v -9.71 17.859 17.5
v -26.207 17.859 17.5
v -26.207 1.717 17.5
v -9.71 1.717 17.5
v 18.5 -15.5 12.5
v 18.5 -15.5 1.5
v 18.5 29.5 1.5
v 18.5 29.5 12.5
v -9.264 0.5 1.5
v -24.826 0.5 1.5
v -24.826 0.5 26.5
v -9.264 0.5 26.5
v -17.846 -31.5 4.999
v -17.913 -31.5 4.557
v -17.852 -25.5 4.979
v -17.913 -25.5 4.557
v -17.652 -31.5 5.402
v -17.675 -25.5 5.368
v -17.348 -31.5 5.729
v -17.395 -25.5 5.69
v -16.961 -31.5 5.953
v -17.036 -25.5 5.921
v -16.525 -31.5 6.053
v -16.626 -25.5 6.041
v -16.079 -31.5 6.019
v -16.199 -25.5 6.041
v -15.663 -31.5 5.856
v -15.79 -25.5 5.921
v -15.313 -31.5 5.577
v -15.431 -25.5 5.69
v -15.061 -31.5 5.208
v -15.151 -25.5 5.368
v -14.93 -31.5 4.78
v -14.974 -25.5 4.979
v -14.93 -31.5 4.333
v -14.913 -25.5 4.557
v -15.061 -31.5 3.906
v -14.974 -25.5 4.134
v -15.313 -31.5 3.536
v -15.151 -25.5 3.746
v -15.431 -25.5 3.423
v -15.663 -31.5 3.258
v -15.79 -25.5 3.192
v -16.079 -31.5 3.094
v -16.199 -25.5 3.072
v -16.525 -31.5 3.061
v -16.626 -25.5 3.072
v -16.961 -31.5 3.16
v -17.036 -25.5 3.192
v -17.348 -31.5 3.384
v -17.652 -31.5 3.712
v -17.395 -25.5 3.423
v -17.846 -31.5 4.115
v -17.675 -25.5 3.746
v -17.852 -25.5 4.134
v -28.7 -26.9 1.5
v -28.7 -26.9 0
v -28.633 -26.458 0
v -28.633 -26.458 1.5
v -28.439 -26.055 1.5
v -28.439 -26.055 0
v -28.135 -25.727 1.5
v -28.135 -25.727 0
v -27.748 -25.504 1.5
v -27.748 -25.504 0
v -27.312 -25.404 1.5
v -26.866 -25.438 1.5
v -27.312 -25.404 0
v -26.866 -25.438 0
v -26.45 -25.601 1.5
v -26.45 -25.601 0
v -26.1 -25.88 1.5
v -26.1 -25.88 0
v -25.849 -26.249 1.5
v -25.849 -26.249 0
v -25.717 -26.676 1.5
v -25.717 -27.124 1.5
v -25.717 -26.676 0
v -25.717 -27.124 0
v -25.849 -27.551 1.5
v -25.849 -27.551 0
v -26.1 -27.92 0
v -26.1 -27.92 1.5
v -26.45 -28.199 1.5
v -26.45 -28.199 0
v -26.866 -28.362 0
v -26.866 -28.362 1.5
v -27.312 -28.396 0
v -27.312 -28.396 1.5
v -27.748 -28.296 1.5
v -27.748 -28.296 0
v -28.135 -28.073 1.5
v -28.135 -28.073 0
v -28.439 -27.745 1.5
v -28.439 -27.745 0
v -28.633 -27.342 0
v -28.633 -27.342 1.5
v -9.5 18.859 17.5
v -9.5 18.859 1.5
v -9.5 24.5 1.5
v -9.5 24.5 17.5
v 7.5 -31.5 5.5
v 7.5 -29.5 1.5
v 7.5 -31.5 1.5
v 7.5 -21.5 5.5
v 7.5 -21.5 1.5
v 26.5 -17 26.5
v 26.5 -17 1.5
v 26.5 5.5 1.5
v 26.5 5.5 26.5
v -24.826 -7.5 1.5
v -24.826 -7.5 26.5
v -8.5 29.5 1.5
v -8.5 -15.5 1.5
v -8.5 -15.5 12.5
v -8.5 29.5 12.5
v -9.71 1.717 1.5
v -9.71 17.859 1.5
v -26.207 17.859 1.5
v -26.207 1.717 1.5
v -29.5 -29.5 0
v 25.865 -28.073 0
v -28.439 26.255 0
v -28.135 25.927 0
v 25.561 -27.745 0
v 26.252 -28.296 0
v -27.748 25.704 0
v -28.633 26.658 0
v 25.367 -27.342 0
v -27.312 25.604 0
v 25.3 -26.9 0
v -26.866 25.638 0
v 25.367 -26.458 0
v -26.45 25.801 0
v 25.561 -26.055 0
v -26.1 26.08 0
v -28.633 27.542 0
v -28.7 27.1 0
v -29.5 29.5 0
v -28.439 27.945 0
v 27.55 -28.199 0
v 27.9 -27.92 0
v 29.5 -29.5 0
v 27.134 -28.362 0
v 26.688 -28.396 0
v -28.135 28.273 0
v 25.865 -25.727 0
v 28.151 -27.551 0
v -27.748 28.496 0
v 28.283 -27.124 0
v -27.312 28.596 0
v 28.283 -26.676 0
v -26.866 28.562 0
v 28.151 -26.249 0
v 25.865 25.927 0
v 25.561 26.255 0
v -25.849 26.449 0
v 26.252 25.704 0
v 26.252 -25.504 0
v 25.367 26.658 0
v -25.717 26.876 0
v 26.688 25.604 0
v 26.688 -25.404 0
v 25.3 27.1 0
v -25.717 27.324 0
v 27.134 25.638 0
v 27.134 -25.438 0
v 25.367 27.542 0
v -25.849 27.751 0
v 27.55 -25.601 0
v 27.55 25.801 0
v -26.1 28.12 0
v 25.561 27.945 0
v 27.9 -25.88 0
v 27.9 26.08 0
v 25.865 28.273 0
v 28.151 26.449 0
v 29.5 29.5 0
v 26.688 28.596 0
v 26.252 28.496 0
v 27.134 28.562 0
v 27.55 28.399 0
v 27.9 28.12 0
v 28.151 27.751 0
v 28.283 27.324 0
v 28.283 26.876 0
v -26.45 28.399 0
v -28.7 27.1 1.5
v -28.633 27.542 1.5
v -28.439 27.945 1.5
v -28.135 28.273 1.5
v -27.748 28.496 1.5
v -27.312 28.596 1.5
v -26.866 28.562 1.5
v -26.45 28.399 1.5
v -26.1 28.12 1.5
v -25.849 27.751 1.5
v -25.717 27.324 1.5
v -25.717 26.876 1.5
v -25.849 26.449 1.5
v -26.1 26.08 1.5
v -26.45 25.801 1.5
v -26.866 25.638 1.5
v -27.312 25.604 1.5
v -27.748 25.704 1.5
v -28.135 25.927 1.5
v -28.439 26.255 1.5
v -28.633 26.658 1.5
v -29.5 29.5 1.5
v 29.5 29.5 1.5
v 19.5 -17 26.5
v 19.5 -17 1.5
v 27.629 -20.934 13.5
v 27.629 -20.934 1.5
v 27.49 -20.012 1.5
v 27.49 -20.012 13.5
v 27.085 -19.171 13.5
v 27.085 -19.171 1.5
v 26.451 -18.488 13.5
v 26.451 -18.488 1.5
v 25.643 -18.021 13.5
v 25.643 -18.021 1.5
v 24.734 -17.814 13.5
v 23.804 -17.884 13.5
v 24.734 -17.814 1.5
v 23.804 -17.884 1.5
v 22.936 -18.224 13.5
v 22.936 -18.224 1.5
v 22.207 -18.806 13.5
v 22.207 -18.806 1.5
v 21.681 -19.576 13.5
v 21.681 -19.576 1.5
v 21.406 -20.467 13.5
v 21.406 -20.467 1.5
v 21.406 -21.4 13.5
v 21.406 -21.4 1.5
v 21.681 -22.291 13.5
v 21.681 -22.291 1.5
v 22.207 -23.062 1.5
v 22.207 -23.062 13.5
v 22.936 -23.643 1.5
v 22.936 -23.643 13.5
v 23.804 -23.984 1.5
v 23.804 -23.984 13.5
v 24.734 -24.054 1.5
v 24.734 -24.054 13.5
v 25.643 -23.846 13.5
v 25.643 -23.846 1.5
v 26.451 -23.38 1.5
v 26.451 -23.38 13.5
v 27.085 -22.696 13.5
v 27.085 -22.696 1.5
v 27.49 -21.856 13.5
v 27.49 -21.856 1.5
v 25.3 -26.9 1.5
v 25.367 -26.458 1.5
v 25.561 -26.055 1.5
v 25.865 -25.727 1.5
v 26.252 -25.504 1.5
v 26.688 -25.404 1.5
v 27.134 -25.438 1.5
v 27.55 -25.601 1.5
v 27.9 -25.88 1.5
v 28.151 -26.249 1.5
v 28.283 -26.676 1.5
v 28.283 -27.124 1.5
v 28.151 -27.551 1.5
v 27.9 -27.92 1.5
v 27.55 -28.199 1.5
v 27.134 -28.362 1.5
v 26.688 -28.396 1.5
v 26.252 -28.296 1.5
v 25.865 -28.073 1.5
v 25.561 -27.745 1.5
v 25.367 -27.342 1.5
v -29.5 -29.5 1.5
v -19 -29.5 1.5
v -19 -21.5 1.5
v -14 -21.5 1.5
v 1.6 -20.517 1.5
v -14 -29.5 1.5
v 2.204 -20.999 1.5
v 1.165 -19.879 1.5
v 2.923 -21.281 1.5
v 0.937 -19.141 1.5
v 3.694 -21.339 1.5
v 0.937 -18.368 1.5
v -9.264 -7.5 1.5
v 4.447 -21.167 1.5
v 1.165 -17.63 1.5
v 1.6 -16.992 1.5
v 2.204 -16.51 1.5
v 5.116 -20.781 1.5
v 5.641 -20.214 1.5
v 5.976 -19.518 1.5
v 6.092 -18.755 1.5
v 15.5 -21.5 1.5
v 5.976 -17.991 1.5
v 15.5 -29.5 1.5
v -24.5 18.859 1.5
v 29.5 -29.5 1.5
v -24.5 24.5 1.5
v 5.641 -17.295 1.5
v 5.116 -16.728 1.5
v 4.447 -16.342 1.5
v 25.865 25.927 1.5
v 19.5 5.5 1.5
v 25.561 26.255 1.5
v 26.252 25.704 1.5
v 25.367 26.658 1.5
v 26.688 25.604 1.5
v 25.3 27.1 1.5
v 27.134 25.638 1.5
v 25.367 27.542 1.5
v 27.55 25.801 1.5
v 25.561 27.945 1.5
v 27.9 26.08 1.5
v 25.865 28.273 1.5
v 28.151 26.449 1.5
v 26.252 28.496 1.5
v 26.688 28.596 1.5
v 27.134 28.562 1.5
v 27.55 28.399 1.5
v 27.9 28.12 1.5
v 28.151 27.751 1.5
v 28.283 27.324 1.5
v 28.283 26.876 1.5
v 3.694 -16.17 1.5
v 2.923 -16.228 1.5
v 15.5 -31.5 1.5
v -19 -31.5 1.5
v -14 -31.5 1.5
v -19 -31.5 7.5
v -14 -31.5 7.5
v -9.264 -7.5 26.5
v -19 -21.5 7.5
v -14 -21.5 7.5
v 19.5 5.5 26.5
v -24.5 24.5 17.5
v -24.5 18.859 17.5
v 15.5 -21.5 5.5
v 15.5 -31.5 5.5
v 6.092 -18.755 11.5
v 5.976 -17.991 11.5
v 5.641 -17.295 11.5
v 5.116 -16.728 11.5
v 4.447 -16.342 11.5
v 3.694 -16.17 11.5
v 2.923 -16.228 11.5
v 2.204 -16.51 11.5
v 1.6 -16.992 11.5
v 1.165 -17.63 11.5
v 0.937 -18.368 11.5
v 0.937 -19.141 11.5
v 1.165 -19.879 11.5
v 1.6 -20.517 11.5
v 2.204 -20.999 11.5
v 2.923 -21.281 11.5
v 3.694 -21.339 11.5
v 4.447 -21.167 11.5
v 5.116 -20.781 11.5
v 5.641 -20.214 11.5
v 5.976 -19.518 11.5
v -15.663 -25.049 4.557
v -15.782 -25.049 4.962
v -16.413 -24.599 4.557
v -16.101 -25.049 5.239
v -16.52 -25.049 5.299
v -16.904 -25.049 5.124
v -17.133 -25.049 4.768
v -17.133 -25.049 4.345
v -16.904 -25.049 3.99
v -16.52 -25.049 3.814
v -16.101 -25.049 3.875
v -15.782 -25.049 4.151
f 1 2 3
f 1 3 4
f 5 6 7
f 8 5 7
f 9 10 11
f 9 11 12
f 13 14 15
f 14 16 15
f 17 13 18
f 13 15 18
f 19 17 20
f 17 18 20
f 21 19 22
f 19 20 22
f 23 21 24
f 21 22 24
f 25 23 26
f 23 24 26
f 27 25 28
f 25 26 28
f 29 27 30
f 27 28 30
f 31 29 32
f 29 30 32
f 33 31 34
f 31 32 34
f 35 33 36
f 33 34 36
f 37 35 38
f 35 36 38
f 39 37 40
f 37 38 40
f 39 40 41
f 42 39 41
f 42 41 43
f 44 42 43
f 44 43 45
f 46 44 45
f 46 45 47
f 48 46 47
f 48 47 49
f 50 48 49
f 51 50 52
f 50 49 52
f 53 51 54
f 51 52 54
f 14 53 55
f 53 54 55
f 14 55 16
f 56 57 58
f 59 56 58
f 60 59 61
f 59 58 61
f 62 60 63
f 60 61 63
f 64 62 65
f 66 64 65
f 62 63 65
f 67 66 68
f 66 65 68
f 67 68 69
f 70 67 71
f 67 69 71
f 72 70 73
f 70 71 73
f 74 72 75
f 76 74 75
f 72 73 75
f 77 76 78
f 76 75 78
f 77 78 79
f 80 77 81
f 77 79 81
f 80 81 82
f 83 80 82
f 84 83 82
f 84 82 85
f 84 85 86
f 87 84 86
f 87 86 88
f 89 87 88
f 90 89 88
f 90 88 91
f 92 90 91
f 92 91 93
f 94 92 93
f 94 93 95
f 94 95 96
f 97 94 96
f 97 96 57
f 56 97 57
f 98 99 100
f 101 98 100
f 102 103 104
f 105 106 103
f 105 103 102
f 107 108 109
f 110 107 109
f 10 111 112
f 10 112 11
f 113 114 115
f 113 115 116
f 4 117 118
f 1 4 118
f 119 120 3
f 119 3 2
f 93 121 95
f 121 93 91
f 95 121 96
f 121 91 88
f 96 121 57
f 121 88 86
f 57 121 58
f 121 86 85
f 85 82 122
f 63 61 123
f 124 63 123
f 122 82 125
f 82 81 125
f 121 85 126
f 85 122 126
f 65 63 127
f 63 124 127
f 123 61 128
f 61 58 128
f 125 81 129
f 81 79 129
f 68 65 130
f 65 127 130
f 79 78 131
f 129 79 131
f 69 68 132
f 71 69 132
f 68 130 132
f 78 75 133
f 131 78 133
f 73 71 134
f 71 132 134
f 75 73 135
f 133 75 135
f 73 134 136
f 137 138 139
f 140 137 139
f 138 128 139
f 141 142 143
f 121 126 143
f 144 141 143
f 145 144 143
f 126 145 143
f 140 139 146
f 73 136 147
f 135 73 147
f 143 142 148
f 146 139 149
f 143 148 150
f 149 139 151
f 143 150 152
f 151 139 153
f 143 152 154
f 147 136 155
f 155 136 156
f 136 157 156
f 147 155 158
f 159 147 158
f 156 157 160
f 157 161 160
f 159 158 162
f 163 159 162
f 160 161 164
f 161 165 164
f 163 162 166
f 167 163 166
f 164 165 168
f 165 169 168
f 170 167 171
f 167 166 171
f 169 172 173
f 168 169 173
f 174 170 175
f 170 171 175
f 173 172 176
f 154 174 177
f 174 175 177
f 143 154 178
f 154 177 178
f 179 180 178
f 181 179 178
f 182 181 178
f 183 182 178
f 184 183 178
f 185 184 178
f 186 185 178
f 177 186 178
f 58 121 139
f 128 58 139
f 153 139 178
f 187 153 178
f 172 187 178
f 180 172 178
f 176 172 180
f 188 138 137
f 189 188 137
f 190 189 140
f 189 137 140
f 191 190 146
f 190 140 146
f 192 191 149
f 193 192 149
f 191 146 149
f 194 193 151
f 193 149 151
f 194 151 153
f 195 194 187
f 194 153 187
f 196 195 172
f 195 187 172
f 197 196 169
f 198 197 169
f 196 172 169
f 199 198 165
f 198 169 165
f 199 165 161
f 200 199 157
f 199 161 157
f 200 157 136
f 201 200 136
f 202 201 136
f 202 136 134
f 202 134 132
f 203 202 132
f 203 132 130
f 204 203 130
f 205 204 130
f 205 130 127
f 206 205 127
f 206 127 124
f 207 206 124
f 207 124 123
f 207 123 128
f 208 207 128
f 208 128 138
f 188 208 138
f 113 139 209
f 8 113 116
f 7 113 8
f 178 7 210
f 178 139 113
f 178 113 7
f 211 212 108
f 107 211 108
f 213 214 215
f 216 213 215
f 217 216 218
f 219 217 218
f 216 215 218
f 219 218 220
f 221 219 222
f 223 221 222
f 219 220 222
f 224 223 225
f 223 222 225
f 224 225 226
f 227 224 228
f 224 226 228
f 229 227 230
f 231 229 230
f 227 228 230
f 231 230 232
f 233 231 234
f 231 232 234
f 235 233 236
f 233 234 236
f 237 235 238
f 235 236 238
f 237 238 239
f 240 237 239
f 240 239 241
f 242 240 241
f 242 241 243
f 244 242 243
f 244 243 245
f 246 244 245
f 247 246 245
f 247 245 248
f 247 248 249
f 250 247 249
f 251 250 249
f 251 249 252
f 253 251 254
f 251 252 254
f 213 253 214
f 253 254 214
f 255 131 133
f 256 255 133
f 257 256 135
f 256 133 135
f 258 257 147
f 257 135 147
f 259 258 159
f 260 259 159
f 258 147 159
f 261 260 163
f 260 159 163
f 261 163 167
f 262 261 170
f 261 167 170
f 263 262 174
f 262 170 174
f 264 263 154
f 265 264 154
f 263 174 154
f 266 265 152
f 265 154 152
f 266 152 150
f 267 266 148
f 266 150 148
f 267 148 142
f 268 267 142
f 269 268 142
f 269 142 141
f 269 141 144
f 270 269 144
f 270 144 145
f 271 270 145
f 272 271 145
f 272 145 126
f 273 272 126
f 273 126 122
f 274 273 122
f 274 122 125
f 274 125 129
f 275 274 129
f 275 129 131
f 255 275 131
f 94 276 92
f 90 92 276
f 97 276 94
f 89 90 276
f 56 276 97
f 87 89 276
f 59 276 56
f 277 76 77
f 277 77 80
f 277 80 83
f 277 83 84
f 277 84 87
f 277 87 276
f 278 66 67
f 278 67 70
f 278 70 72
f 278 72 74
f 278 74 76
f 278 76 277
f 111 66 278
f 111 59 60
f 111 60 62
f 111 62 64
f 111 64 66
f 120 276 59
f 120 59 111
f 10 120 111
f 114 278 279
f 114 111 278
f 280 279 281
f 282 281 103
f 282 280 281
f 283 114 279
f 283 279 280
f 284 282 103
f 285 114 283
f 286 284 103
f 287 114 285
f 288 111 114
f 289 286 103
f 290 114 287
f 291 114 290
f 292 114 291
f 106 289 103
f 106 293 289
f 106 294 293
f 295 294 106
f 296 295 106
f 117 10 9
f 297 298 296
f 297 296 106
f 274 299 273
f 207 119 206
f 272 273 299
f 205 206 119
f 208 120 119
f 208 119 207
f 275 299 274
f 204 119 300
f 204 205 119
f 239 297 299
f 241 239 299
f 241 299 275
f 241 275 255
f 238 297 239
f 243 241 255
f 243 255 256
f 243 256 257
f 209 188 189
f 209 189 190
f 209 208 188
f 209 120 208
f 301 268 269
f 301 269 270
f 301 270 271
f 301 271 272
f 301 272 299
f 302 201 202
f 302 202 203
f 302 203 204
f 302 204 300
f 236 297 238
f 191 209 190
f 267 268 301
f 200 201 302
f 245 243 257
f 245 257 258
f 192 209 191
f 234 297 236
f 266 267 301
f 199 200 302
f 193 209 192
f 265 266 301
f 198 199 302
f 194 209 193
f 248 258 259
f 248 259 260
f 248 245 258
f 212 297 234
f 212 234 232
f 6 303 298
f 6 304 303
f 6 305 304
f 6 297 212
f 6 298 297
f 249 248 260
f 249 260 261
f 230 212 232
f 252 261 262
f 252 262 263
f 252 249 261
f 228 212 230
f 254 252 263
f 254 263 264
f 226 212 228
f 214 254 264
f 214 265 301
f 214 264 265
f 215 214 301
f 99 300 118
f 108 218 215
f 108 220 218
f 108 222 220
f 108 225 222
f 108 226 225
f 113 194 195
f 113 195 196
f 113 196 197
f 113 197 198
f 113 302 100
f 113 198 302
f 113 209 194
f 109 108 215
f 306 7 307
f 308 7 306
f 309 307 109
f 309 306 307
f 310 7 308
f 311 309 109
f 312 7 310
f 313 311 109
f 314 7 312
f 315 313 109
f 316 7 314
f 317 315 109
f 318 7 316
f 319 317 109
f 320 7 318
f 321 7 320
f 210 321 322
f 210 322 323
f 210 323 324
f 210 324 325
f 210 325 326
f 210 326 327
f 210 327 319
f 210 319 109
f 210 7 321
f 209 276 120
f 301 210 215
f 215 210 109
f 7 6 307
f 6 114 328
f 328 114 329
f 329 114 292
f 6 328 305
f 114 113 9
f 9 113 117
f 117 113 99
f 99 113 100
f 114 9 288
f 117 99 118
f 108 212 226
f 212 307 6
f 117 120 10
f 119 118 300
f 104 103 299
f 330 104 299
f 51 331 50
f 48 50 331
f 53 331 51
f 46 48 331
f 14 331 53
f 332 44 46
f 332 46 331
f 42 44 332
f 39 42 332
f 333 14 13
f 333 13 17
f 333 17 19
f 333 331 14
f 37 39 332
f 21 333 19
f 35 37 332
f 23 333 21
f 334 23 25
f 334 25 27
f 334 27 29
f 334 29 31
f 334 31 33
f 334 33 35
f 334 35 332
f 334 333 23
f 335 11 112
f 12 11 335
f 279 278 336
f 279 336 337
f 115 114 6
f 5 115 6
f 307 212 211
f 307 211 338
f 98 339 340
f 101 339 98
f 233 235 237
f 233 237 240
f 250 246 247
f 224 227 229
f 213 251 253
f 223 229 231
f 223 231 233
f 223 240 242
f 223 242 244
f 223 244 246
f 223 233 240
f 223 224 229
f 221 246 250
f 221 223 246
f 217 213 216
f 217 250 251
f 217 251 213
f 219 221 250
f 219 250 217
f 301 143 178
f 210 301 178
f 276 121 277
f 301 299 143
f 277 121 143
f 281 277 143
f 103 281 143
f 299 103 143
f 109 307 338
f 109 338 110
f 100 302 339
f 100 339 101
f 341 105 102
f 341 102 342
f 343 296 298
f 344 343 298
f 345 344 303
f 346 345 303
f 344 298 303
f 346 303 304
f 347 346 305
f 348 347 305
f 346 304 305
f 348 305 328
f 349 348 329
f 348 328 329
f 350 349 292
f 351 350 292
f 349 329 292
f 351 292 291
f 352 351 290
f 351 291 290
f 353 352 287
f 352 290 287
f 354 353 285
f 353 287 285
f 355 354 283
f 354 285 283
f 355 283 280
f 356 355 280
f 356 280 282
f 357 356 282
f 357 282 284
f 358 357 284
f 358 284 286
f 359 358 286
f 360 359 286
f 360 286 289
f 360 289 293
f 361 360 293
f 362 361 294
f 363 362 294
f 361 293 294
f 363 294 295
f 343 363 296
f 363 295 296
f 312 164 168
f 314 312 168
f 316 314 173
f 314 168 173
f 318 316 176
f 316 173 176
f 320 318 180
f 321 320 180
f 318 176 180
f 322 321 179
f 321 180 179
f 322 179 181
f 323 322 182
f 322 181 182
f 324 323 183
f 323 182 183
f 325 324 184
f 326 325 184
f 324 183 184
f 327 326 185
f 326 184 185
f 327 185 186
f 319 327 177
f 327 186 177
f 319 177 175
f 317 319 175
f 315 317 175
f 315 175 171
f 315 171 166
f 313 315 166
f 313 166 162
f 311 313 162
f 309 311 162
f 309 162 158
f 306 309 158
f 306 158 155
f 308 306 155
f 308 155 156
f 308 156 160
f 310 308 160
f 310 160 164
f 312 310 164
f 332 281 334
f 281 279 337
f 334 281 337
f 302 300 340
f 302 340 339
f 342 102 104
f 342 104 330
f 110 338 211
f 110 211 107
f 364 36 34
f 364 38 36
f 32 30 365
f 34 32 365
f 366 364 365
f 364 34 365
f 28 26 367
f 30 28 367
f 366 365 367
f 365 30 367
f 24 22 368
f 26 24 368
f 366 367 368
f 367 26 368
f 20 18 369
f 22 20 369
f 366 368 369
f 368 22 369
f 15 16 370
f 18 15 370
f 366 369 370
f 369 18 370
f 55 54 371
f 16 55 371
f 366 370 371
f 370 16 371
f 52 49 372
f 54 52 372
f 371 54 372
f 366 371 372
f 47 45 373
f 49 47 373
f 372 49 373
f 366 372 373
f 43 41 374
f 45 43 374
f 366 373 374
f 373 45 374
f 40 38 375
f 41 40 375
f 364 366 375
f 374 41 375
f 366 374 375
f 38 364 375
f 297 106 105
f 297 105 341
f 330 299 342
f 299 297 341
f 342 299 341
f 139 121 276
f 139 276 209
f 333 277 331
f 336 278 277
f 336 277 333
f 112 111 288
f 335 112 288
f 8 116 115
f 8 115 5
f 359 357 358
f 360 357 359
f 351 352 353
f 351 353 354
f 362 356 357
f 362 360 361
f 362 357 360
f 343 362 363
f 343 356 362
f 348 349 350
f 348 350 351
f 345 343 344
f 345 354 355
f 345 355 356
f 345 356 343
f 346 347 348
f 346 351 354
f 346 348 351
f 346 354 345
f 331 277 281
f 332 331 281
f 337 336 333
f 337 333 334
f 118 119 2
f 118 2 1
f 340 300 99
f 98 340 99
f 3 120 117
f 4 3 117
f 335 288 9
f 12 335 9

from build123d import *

# Parameters (mm, degrees)
F0_W      = 59
F0_H      = 59
F1_DEPTH  = 1.5
F3_D      = 3
F3_DEPTH  = 3
F3_TIP    = 0.9012909285
F2_W      = 27
F2_H      = 45
F4_DEPTH  = 11
F2_W_2    = 7
F2_H_2    = 22.5
F5_DEPTH  = 25
F2_W_3    = 15
F2_H_3    = 5.6414641738
F6_DEPTH  = 16
F2_W_4    = 16.4975724295
F2_H_4    = 16.1418512762
F7_DEPTH  = 16
F2_W_5    = 15.5616942793
F2_H_5    = 8
F8_DEPTH  = 25
F2_W_6    = 5
F9_DEPTH  = 6
F2_R      = 3.1285701803
F10_DEPTH = 12
F11_W     = 5
F11_H     = 6
F12_DEPTH = 2
F14_D     = 3
F14_DEPTH = 6
F14_TIP   = 0.9012909285
F2_W_7    = 8
F15_DEPTH = 4
F16_W     = 8
F16_H     = 4
F17_DEPTH = 2
F2_R_2    = 2.591599319
F18_DEPTH = 10


with BuildPart() as f1:
    # F0 (on Top) → F1 (new body)
    with BuildSketch(Plane.XY):
        Rectangle(F0_W, F0_H)
    extrude(amount=F1_DEPTH)

    # F3
    with Locations(Plane.XY.offset(1.5)):
        with Locations((26.8, -26.9), (-27.2, -26.9), (-27.2, 27.1), (26.8, 27.1)):
            Hole(F3_D / 2, depth=F3_DEPTH)
            with Locations((0, 0, -(F3_DEPTH + F3_TIP / 2))):  # 118° drill point
                Cone(0, F3_D / 2, F3_TIP, mode=Mode.SUBTRACT)

    # F2 (on face) → F4 (join)
    with BuildSketch(Plane.XY.offset(1.5)):
        with Locations((5, 7)):
            Rectangle(F2_W, F2_H)
    extrude(amount=F4_DEPTH)

    # F2 (on face) → F5 (join)
    with BuildSketch(Plane.XY.offset(1.5)):
        with Locations((23, -5.75)):
            Rectangle(F2_W_2, F2_H_2)
    extrude(amount=F5_DEPTH)

    # F2 (on face) → F6 (join)
    with BuildSketch(Plane.XY.offset(1.5)):
        with Locations((-17, 21.6792679131)):
            Rectangle(F2_W_3, F2_H_3)
    extrude(amount=F6_DEPTH)

    # F2 (on face) → F7 (join)
    with BuildSketch(Plane.XY.offset(1.5)):
        with Locations((-17.9585402422, 9.7876101881)):
            Rectangle(F2_W_4, F2_H_4)
    extrude(amount=F7_DEPTH)

    # F2 (on face) → F8 (join)
    with BuildSketch(Plane.XY.offset(1.5)):
        with Locations((-17.0449977741, -3.5)):
            Rectangle(F2_W_5, F2_H_5)
    extrude(amount=F8_DEPTH)

    # F2 (on face) → F9 (join)
    with BuildSketch(Plane.XY.offset(1.5)):
        with Locations((-16.5, -25.5)):
            Rectangle(F2_W_6, F2_H_5)
        with Locations((-17.0449977741, -3.5)):
            Rectangle(F2_W_5, F2_H_5)
    extrude(amount=F9_DEPTH)

    # F2 (on face) → F10 (join)
    with BuildSketch(Plane.XY.offset(1.5)):
        with Locations((24.5, -20.9337305278)):
            Circle(F2_R)
    extrude(amount=F10_DEPTH)

    # F11 (on face) → F12 (join)
    with BuildSketch(Plane.XZ.offset(29.5)):
        with Locations((-16.5, 4.5)):
            Rectangle(F11_W, F11_H)
    extrude(amount=F12_DEPTH)

    # F14
    with Locations(Plane.XZ.offset(31.5)):
        with Locations((-16.4128988981, 4.5567261986)):
            Hole(F14_D / 2, depth=F14_DEPTH)
            with Locations((0, 0, -(F14_DEPTH + F14_TIP / 2))):  # 118° drill point
                Cone(0, F14_D / 2, F14_TIP, mode=Mode.SUBTRACT)

    # F2 (on face) → F15 (join)
    with BuildSketch(Plane.XY.offset(1.5)):
        with Locations((11.5, -25.5)):
            Rectangle(F2_W_7, F2_H_5)
    extrude(amount=F15_DEPTH)

    # F16 (on face) → F17 (join)
    with BuildSketch(Plane.XZ.offset(29.5)):
        with Locations((11.5, 3.5)):
            Rectangle(F16_W, F16_H)
    extrude(amount=F17_DEPTH)

    # F2 (on face) → F18 (join)
    with BuildSketch(Plane.XY.offset(1.5)):
        with Locations((3.5, -18.7545120716)):
            Circle(F2_R_2)
    extrude(amount=F18_DEPTH)


solid = f1.part
